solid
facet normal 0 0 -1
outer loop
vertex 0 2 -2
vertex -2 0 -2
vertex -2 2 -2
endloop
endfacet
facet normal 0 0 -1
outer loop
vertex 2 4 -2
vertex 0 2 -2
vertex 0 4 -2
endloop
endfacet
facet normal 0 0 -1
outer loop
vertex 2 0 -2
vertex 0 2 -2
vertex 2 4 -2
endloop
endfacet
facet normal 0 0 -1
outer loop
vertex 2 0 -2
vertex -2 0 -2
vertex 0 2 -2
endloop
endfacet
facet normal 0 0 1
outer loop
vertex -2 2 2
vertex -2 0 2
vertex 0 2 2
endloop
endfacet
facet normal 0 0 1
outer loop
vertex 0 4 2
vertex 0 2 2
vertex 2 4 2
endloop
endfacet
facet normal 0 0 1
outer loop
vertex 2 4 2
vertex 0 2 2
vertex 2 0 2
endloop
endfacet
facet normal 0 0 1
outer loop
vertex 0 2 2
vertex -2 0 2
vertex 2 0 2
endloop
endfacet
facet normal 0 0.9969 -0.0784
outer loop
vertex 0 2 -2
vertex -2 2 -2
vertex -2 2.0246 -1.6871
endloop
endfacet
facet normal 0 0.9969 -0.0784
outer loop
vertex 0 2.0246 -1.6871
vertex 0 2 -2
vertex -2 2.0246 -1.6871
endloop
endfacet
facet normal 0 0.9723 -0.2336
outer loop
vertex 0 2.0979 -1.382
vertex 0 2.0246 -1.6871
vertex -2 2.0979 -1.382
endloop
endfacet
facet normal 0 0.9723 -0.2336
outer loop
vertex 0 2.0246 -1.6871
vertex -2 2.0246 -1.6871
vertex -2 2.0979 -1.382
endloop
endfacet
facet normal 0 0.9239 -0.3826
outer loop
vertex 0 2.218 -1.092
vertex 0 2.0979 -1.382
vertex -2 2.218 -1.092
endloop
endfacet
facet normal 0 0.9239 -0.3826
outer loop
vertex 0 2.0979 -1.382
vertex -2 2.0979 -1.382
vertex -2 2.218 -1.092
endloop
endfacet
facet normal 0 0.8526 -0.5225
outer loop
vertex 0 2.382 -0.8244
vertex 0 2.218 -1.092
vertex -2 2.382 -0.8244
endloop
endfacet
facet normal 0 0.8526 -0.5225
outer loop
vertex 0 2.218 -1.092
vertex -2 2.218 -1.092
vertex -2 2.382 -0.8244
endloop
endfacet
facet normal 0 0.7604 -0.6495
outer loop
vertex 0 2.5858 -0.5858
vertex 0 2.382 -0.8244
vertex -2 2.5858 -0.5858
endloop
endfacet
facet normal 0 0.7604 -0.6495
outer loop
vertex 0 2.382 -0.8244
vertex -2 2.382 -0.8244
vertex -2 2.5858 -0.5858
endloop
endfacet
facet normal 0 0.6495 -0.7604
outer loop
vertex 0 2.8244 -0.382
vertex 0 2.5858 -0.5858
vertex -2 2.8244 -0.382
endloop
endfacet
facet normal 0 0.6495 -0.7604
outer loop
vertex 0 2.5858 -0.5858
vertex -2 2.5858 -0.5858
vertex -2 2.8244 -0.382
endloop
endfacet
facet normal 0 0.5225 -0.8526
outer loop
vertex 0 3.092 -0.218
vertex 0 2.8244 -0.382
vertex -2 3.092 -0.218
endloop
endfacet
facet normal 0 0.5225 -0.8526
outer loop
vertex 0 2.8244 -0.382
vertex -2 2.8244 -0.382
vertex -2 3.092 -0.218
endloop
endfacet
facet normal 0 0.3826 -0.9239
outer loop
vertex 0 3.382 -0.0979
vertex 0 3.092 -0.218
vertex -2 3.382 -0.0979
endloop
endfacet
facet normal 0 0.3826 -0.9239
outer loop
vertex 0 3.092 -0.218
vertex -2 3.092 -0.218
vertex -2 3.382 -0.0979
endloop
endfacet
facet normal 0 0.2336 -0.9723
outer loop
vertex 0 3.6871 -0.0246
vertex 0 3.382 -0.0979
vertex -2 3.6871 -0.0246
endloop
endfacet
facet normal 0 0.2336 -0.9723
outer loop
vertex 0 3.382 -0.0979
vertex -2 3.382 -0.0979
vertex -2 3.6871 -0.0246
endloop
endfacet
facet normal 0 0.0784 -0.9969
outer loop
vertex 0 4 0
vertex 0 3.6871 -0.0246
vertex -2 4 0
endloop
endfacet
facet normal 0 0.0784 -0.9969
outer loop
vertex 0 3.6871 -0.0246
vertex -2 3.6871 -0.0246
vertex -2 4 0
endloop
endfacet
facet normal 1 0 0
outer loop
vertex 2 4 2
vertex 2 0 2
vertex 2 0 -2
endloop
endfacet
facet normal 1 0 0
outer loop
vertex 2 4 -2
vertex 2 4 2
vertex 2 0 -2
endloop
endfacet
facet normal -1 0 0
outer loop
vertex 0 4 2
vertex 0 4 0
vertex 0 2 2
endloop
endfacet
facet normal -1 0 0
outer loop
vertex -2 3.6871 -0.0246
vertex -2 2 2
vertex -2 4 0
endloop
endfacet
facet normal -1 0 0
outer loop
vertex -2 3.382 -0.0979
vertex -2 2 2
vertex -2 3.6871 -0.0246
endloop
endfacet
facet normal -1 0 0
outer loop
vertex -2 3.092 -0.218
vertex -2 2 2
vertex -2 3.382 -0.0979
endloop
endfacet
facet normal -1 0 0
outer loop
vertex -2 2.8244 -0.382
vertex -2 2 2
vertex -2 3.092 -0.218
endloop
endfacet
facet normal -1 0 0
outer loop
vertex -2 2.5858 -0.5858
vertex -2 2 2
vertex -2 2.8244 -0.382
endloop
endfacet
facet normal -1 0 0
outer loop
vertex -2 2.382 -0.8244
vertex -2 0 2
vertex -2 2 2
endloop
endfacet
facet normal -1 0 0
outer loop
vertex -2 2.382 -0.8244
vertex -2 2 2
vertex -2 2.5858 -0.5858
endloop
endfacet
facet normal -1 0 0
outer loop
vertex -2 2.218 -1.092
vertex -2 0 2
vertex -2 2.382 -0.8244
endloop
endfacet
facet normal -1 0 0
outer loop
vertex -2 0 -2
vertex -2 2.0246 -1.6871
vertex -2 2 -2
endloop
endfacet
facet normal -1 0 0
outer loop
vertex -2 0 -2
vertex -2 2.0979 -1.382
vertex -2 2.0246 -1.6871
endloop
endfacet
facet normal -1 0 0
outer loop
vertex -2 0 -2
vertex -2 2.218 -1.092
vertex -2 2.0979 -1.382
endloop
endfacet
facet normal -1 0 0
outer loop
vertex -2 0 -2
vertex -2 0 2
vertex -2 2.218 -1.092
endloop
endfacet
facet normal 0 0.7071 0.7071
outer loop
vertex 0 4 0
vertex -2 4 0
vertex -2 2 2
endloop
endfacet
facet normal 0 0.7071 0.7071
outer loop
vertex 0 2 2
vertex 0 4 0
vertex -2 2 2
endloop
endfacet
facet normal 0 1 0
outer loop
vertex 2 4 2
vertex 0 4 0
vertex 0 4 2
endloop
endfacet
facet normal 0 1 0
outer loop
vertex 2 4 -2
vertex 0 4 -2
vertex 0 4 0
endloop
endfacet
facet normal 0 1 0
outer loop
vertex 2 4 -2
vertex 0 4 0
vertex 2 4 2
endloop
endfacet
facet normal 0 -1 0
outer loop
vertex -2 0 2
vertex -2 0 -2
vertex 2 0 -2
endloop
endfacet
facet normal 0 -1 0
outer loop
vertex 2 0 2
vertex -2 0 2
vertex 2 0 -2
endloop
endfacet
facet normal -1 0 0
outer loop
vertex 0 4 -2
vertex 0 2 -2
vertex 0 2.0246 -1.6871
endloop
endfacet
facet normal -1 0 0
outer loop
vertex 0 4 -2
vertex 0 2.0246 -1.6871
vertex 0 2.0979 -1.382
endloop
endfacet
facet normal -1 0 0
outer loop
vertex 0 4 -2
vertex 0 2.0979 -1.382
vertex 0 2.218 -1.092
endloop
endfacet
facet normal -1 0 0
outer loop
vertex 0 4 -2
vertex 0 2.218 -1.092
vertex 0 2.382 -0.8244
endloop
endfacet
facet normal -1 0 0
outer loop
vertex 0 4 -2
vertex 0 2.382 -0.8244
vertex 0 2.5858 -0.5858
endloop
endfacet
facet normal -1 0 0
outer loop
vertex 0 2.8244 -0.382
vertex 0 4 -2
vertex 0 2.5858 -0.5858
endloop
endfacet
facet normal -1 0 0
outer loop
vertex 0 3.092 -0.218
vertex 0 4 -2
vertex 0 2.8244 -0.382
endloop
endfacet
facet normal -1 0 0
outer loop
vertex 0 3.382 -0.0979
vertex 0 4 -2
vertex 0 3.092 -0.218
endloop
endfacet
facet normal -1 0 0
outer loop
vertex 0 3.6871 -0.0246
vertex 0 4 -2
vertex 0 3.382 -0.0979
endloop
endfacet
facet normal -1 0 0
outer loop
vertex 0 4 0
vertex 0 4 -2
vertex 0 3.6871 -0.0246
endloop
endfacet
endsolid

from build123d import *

# Parameters (mm, degrees)
SKETCH1_W           = 4
SKETCH1_H           = 4
BOSS_EXTRUDE1_DEPTH = 4
CUT_EXTRUDE1_DEPTH  = 2


with BuildPart() as part:
    # Sketch1 → Boss-Extrude1 (new body)
    with BuildSketch(Plane(origin=(0, 0, 0), x_dir=(1, 0, 0), z_dir=(0, 1, 0))):
        Rectangle(SKETCH1_W, SKETCH1_H)
    extrude(amount=BOSS_EXTRUDE1_DEPTH)

    # Sketch2 → Cut-Extrude1 (cut)
    with BuildSketch(Plane.ZY.offset(2)):
        Polygon((0, 4), (2, 2), (2, 4), align=None)
        with BuildLine():
            ThreePointArc((-2, 2), (-0.585786438, 2.585786438), (0, 4))
            Line((0, 4), (-2, 4))
            Line((-2, 4), (-2, 2))
        make_face()
    extrude(amount=-CUT_EXTRUDE1_DEPTH, mode=Mode.SUBTRACT)


solid = part.part
